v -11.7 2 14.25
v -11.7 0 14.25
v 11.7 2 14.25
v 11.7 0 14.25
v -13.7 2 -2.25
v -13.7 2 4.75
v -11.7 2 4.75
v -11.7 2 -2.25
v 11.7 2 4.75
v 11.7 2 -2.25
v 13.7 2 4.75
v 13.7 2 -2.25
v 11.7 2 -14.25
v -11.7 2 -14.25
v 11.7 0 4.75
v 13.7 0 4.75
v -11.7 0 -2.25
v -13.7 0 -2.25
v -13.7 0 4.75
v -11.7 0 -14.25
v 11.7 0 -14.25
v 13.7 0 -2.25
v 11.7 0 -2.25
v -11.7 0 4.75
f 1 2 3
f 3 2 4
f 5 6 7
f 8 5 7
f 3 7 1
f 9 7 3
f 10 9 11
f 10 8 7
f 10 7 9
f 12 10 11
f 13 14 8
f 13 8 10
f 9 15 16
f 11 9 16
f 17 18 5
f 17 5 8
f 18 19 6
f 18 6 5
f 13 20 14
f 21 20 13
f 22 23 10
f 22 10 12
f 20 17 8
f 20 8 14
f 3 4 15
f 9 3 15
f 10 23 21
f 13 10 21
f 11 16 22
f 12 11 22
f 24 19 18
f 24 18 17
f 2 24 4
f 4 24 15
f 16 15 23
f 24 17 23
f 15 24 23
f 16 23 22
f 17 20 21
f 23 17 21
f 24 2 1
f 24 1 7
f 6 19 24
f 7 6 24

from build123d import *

# Parameters (mm, degrees)
SKETCH1_W           = 23.4
SKETCH1_H           = 28.5
SKETCH1_W_2         = 2
SKETCH1_H_2         = 7
BOSS_EXTRUDE1_DEPTH = 2


with BuildPart() as part:
    # Sketch1 → Boss-Extrude1 (new body)
    with BuildSketch(Plane(origin=(0, 0, 0), x_dir=(1, 0, 0), z_dir=(0, 1, 0))):
        Rectangle(SKETCH1_W, SKETCH1_H)
        with Locations((-12.7, -1.25)):
            Rectangle(SKETCH1_W_2, SKETCH1_H_2)
        with Locations((12.7, -1.25)):
            Rectangle(SKETCH1_W_2, SKETCH1_H_2)
    extrude(amount=BOSS_EXTRUDE1_DEPTH)


solid = part.part
